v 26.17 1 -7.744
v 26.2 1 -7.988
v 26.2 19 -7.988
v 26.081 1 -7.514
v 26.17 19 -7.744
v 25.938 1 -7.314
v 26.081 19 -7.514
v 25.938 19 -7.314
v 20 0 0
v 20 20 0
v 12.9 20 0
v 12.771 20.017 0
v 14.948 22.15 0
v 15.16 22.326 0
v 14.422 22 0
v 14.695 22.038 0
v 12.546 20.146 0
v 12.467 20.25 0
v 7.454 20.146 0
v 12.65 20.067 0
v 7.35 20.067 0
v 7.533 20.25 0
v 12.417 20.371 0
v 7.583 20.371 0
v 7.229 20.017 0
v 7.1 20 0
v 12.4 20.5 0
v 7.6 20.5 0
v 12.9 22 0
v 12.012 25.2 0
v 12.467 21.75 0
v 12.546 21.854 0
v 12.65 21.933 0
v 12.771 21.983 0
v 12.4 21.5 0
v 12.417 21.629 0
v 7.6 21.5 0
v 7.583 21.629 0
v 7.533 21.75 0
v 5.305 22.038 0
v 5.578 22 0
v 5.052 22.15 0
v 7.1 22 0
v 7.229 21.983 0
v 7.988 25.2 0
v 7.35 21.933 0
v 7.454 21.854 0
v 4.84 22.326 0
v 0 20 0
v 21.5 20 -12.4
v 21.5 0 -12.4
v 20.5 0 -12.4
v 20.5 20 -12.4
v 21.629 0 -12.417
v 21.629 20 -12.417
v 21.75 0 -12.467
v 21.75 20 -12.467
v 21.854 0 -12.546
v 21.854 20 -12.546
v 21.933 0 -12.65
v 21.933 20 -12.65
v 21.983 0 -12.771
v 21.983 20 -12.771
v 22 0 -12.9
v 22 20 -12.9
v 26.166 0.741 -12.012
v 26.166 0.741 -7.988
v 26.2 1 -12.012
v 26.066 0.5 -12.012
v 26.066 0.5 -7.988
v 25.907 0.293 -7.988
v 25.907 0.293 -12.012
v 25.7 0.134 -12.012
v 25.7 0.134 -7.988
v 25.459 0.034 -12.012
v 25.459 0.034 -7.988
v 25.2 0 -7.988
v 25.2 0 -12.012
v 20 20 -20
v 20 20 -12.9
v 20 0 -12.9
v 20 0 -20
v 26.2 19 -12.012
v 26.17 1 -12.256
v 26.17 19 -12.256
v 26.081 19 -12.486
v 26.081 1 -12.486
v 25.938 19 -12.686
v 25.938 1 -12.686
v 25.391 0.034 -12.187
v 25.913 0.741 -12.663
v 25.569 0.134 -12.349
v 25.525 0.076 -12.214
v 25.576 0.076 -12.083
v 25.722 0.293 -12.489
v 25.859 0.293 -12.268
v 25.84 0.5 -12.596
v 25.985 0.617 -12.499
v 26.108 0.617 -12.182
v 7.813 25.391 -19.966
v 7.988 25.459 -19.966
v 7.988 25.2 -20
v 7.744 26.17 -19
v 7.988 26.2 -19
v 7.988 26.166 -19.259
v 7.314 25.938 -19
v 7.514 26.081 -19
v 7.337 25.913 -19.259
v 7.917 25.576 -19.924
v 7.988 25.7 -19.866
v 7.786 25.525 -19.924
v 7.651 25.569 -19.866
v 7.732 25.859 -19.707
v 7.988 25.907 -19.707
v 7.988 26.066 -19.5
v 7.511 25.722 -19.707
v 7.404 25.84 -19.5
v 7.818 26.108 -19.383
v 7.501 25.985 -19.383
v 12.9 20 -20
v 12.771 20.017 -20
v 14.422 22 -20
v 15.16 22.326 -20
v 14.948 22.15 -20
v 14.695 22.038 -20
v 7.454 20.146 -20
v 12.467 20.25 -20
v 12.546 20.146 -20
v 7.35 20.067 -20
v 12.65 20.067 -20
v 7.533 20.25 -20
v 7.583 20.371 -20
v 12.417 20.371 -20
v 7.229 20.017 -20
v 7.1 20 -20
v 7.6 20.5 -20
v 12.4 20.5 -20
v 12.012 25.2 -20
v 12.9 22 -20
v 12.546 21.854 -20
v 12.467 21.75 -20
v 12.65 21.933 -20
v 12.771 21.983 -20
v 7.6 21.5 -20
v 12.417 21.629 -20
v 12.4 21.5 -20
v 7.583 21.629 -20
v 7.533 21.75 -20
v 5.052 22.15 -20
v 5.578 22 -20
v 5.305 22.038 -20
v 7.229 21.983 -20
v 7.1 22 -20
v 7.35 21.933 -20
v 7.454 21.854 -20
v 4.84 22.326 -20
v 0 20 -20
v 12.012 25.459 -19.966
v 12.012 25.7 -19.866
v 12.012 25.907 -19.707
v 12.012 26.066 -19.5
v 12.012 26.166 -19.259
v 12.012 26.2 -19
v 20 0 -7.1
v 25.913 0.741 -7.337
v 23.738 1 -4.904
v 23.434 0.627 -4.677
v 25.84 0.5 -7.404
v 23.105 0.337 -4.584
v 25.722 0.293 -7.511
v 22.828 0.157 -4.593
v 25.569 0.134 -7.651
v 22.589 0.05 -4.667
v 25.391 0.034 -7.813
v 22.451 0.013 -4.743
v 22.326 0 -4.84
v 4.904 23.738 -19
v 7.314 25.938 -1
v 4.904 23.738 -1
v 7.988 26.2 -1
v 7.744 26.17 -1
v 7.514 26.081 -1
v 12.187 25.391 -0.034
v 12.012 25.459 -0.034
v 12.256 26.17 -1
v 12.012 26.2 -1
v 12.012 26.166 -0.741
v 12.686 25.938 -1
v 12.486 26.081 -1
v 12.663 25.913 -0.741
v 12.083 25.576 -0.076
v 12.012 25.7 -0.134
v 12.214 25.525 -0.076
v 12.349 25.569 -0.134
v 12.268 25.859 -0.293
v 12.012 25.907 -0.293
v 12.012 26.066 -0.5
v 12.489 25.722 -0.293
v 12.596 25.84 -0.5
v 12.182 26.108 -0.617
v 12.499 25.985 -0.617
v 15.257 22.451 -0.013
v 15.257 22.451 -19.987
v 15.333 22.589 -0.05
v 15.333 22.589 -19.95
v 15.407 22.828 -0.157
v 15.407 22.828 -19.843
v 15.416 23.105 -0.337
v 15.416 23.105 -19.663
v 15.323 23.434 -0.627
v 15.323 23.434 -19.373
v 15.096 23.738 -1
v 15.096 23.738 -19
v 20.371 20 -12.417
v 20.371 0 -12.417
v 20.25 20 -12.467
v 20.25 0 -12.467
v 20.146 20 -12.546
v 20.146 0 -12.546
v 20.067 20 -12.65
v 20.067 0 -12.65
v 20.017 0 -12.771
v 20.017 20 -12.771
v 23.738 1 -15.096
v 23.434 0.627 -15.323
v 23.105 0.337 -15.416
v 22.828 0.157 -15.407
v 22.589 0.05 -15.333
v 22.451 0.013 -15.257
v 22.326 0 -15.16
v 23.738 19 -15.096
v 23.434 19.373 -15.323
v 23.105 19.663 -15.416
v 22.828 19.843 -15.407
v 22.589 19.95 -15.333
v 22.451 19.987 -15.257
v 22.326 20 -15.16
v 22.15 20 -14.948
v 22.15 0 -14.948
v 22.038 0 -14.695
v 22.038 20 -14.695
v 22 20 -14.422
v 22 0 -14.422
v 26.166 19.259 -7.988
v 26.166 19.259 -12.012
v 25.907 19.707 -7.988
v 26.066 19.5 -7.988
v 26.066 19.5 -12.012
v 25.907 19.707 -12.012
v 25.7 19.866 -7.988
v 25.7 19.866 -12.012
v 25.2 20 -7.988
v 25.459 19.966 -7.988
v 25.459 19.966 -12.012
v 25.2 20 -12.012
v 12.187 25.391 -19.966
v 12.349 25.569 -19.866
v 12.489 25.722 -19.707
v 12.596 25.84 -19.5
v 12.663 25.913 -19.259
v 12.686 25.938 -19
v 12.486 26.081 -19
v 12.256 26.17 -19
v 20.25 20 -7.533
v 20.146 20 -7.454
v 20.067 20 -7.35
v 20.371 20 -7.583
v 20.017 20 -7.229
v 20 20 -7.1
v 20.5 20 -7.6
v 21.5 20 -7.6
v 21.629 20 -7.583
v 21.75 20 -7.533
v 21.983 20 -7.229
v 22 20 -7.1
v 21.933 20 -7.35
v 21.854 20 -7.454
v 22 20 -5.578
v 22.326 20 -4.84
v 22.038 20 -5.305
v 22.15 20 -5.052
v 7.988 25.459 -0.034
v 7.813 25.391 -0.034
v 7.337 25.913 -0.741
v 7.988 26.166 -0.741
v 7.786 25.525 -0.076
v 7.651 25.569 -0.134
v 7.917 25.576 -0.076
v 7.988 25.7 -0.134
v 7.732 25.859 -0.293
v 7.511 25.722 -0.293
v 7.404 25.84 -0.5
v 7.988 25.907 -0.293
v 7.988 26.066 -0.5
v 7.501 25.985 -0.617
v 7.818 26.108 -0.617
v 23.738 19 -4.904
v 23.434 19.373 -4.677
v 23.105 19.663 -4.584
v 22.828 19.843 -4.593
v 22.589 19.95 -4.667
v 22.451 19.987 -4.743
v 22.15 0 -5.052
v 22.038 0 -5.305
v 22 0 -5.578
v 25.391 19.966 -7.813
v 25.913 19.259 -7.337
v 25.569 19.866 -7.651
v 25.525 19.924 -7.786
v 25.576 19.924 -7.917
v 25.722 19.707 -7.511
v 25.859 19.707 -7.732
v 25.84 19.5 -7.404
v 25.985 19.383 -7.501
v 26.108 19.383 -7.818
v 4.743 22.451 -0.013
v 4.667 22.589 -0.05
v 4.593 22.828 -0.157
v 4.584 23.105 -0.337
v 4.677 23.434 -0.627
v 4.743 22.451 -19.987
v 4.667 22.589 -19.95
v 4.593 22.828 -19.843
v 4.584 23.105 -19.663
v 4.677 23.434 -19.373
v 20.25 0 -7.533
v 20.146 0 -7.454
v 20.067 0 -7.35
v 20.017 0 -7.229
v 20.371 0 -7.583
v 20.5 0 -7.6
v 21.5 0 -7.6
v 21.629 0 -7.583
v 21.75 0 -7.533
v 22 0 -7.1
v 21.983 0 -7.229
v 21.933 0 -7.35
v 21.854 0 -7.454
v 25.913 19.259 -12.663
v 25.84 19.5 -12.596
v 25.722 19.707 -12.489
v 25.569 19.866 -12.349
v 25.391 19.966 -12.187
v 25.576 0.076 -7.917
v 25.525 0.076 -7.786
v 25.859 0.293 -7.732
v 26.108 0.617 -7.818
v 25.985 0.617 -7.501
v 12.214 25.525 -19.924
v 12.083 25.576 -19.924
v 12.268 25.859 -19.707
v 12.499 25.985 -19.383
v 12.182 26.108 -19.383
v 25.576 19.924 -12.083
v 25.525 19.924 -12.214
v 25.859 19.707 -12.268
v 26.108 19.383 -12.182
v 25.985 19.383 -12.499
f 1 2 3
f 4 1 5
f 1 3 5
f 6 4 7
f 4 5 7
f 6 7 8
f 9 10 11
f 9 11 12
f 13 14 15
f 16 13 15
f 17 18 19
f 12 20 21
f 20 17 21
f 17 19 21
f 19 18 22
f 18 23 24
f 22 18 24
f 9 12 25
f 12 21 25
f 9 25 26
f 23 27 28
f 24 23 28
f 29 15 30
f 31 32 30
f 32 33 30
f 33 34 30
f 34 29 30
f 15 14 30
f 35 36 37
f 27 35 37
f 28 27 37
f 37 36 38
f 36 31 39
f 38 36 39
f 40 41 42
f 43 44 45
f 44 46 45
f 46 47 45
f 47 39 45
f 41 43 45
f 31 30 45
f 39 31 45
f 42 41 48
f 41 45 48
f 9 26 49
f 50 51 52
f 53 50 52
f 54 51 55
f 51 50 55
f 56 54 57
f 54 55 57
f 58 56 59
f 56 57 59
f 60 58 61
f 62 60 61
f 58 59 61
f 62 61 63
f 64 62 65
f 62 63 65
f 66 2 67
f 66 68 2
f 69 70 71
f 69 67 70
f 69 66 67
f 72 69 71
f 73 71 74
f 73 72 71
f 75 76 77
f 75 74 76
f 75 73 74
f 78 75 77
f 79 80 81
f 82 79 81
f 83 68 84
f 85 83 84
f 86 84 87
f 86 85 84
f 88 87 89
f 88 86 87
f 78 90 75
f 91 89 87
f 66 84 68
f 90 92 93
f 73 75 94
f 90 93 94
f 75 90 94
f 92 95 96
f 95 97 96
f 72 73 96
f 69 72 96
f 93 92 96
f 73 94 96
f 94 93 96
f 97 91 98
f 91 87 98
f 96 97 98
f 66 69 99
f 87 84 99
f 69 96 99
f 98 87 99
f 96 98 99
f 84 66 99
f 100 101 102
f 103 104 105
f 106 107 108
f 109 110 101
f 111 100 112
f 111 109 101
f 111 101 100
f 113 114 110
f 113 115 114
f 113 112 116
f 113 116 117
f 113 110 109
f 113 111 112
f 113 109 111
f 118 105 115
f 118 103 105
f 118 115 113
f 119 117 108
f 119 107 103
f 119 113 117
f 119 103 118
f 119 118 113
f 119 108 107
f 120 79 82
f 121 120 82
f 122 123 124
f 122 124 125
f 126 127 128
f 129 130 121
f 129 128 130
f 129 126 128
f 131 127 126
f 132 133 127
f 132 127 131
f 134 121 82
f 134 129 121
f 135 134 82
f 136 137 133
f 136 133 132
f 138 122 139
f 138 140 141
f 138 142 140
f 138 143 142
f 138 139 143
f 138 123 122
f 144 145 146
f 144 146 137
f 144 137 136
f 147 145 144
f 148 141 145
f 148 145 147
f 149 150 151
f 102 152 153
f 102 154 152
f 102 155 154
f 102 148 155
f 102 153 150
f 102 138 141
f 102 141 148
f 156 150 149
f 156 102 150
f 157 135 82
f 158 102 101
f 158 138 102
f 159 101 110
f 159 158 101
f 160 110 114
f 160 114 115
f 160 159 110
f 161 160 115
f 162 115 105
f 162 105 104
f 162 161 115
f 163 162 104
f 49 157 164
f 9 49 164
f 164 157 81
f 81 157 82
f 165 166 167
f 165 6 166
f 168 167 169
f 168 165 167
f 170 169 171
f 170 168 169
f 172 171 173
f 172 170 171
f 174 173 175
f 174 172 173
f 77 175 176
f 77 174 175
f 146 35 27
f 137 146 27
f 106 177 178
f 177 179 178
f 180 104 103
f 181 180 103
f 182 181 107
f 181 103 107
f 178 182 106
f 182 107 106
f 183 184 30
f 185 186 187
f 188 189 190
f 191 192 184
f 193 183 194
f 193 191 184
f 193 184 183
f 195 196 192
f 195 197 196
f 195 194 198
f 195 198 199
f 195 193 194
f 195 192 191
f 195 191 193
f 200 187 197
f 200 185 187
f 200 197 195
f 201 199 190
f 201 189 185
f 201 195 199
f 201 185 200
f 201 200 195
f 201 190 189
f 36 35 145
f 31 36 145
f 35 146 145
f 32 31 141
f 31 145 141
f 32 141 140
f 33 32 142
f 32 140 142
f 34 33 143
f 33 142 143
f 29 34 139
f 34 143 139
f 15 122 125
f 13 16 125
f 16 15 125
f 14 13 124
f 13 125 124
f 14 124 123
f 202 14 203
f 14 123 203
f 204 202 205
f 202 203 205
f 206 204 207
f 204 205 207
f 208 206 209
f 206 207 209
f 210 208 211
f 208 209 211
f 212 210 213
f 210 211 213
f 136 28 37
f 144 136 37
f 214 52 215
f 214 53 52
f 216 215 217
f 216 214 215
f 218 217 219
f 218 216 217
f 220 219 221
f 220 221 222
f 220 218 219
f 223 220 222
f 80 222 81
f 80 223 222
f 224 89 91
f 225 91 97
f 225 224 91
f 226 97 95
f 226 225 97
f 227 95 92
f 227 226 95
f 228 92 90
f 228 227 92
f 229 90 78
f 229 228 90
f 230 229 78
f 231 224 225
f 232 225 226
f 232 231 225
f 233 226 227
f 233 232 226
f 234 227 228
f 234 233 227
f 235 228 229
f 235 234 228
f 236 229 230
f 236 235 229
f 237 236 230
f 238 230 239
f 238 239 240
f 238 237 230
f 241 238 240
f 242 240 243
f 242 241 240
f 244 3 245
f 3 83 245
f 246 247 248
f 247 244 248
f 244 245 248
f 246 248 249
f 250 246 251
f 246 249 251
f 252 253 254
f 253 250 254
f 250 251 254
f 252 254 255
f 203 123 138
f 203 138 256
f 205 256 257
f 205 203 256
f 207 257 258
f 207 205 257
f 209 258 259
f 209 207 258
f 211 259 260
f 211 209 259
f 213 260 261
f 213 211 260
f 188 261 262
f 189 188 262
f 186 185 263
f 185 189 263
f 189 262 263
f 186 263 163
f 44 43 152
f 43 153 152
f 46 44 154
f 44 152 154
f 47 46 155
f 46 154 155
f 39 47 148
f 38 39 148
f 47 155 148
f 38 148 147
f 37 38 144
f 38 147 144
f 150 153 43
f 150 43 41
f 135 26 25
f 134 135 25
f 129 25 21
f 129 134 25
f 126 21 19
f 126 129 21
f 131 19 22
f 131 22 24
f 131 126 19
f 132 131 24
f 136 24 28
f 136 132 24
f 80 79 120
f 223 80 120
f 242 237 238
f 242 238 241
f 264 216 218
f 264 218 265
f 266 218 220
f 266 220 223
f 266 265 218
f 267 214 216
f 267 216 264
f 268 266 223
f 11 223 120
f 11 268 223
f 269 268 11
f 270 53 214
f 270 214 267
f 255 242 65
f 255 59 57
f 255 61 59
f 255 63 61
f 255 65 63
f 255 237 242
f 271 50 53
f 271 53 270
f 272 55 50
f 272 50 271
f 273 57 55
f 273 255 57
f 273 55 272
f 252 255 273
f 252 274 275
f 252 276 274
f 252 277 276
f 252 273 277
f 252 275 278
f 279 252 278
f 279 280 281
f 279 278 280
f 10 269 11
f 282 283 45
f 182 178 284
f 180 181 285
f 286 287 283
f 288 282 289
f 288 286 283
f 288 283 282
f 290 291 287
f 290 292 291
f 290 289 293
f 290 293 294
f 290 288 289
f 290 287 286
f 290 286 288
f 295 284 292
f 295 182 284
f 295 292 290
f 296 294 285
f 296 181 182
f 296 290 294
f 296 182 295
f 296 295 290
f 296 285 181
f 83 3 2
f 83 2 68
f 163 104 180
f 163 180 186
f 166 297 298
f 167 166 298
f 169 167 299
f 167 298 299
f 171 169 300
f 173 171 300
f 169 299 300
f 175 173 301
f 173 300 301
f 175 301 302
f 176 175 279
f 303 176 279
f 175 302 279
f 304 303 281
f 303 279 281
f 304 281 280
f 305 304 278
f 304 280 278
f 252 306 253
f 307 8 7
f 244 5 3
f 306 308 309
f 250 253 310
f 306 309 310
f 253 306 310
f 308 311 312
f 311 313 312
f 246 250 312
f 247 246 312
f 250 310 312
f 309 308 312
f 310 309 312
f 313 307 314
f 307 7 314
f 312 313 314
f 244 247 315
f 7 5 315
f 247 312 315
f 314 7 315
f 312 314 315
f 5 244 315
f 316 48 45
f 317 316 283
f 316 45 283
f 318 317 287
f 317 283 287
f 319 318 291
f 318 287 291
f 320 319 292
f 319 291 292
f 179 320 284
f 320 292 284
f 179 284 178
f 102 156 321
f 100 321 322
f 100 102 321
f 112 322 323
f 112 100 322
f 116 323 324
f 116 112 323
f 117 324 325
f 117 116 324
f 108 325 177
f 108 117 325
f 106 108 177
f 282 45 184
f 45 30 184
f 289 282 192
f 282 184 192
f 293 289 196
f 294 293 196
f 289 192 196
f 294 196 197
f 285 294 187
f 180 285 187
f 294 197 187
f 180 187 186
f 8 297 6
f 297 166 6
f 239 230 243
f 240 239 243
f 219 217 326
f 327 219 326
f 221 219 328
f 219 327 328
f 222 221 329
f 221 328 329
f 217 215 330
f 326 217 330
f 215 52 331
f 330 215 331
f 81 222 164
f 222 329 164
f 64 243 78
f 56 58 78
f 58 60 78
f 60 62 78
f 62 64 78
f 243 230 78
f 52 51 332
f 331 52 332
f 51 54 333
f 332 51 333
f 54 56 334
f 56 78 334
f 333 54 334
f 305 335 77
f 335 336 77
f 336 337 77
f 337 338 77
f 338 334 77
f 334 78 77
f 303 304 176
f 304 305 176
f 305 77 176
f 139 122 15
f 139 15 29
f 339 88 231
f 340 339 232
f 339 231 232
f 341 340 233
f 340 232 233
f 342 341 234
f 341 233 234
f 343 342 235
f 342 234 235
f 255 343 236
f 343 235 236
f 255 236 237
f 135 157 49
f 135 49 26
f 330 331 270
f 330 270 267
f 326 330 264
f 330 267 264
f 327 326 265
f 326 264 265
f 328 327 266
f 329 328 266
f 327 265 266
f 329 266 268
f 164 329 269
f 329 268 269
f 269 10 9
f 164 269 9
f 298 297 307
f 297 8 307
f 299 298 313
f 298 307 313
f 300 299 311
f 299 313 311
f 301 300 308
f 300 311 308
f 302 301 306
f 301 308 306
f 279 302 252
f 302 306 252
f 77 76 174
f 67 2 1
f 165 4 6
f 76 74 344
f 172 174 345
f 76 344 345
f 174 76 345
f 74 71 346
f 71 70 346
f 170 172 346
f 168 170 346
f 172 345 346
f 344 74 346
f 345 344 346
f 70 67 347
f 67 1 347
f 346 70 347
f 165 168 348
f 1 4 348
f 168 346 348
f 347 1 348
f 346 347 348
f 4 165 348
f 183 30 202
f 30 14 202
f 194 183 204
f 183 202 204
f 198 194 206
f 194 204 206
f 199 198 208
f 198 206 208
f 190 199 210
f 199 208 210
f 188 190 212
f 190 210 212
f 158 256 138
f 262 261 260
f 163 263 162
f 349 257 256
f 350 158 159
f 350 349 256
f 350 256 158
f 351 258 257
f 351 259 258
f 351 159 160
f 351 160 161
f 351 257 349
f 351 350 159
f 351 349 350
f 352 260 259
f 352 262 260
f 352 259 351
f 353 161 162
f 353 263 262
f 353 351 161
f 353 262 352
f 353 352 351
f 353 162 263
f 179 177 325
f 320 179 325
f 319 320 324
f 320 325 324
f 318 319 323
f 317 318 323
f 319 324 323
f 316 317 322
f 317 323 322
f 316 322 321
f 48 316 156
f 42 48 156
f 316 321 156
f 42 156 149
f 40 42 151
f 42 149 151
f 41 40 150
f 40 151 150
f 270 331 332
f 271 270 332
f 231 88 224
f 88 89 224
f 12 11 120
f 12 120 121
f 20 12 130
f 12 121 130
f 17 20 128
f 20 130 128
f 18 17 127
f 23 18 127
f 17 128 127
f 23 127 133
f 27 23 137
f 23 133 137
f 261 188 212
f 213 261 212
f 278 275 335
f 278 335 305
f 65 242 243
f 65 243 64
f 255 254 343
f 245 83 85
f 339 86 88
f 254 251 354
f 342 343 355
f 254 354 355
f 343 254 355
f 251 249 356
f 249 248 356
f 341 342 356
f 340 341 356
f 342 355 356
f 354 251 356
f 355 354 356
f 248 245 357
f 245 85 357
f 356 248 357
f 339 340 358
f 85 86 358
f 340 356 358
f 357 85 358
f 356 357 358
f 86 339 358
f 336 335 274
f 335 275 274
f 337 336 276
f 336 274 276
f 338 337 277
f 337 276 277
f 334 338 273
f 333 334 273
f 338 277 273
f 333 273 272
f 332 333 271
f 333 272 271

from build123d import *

# Parameters (mm, degrees)
BOSS_EXTRUDE1_DEPTH = 20
BOSS_EXTRUDE2_DEPTH = 20
FILLET3_R           = 1
FILLET4_R           = 0.5


with BuildPart() as part:
    # Sketch1 → Boss-Extrude1 (new body)
    with BuildSketch(Plane.XY):
        Polygon((7.6, 26.2), (12.4, 26.2), (17, 22), (12.4, 22), (12.4, 20), (20, 20), (20, 0), (0, 0), (0, 20), (7.6, 20), (7.6, 22), (3, 22), align=None)
    extrude(amount=-BOSS_EXTRUDE1_DEPTH)

    # Sketch2 → Boss-Extrude2 (add)
    with BuildSketch(Plane(origin=(0, 0, 0), x_dir=(0, 0, -1), z_dir=(0, -1, 0))):
        Polygon((7.6, 26.2), (12.4, 26.2), (17, 22), (12.4, 22), (12.4, 20), (20, 20), (20, 0), (0, 0), (0, 20), (7.6, 20), (7.6, 22), (3, 22), align=None)
    extrude(amount=-BOSS_EXTRUDE2_DEPTH)

    # SurfaceCut1
    split(bisect_by=Plane(origin=(10, 10, 0), x_dir=(0.7071067811865476, -0.7071067811865475, 0), z_dir=(0.7071067811865475, 0.7071067811865476, 0)), keep=Keep.TOP)

    # Fillet3
    fillet3_edges = [part.edges().sort_by_distance(p)[0] for p in [
        (5.3, 24.1, -20),
        (5.3, 24.1, 0),
        (10, 26.2, 0),
        (14.7, 24.1, 0),
        (17, 22, -10),
        (3, 22, -10),
        (7.6, 26.2, -10),
        (12.4, 26.2, -10),
        (24.1, 20, -14.7),
        (26.2, 10, -12.4),
        (22, 10, -17),
        (14.7, 24.1, -20),
        (24.1, 20, -5.3),
        (22, 10, -3),
        (26.2, 20, -10),
        (26.2, 10, -7.6),
        (24.1, 0, -14.7),
        (26.2, 0, -10),
        (24.1, 0, -5.3),
        (10, 26.2, -20),
    ]]
    fillet(fillet3_edges, radius=FILLET3_R)

    # Fillet4
    fillet4_edges = [part.edges().sort_by_distance(p)[0] for p in [
        (12.4, 22, -10),
        (12.4, 20, -10),
        (7.6, 20, -10),
        (7.6, 22, -10),
        (22, 10, -12.4),
        (20, 10, -12.4),
        (20, 10, -7.6),
        (22, 10, -7.6),
    ]]
    fillet(fillet4_edges, radius=FILLET4_R)


solid = part.part
